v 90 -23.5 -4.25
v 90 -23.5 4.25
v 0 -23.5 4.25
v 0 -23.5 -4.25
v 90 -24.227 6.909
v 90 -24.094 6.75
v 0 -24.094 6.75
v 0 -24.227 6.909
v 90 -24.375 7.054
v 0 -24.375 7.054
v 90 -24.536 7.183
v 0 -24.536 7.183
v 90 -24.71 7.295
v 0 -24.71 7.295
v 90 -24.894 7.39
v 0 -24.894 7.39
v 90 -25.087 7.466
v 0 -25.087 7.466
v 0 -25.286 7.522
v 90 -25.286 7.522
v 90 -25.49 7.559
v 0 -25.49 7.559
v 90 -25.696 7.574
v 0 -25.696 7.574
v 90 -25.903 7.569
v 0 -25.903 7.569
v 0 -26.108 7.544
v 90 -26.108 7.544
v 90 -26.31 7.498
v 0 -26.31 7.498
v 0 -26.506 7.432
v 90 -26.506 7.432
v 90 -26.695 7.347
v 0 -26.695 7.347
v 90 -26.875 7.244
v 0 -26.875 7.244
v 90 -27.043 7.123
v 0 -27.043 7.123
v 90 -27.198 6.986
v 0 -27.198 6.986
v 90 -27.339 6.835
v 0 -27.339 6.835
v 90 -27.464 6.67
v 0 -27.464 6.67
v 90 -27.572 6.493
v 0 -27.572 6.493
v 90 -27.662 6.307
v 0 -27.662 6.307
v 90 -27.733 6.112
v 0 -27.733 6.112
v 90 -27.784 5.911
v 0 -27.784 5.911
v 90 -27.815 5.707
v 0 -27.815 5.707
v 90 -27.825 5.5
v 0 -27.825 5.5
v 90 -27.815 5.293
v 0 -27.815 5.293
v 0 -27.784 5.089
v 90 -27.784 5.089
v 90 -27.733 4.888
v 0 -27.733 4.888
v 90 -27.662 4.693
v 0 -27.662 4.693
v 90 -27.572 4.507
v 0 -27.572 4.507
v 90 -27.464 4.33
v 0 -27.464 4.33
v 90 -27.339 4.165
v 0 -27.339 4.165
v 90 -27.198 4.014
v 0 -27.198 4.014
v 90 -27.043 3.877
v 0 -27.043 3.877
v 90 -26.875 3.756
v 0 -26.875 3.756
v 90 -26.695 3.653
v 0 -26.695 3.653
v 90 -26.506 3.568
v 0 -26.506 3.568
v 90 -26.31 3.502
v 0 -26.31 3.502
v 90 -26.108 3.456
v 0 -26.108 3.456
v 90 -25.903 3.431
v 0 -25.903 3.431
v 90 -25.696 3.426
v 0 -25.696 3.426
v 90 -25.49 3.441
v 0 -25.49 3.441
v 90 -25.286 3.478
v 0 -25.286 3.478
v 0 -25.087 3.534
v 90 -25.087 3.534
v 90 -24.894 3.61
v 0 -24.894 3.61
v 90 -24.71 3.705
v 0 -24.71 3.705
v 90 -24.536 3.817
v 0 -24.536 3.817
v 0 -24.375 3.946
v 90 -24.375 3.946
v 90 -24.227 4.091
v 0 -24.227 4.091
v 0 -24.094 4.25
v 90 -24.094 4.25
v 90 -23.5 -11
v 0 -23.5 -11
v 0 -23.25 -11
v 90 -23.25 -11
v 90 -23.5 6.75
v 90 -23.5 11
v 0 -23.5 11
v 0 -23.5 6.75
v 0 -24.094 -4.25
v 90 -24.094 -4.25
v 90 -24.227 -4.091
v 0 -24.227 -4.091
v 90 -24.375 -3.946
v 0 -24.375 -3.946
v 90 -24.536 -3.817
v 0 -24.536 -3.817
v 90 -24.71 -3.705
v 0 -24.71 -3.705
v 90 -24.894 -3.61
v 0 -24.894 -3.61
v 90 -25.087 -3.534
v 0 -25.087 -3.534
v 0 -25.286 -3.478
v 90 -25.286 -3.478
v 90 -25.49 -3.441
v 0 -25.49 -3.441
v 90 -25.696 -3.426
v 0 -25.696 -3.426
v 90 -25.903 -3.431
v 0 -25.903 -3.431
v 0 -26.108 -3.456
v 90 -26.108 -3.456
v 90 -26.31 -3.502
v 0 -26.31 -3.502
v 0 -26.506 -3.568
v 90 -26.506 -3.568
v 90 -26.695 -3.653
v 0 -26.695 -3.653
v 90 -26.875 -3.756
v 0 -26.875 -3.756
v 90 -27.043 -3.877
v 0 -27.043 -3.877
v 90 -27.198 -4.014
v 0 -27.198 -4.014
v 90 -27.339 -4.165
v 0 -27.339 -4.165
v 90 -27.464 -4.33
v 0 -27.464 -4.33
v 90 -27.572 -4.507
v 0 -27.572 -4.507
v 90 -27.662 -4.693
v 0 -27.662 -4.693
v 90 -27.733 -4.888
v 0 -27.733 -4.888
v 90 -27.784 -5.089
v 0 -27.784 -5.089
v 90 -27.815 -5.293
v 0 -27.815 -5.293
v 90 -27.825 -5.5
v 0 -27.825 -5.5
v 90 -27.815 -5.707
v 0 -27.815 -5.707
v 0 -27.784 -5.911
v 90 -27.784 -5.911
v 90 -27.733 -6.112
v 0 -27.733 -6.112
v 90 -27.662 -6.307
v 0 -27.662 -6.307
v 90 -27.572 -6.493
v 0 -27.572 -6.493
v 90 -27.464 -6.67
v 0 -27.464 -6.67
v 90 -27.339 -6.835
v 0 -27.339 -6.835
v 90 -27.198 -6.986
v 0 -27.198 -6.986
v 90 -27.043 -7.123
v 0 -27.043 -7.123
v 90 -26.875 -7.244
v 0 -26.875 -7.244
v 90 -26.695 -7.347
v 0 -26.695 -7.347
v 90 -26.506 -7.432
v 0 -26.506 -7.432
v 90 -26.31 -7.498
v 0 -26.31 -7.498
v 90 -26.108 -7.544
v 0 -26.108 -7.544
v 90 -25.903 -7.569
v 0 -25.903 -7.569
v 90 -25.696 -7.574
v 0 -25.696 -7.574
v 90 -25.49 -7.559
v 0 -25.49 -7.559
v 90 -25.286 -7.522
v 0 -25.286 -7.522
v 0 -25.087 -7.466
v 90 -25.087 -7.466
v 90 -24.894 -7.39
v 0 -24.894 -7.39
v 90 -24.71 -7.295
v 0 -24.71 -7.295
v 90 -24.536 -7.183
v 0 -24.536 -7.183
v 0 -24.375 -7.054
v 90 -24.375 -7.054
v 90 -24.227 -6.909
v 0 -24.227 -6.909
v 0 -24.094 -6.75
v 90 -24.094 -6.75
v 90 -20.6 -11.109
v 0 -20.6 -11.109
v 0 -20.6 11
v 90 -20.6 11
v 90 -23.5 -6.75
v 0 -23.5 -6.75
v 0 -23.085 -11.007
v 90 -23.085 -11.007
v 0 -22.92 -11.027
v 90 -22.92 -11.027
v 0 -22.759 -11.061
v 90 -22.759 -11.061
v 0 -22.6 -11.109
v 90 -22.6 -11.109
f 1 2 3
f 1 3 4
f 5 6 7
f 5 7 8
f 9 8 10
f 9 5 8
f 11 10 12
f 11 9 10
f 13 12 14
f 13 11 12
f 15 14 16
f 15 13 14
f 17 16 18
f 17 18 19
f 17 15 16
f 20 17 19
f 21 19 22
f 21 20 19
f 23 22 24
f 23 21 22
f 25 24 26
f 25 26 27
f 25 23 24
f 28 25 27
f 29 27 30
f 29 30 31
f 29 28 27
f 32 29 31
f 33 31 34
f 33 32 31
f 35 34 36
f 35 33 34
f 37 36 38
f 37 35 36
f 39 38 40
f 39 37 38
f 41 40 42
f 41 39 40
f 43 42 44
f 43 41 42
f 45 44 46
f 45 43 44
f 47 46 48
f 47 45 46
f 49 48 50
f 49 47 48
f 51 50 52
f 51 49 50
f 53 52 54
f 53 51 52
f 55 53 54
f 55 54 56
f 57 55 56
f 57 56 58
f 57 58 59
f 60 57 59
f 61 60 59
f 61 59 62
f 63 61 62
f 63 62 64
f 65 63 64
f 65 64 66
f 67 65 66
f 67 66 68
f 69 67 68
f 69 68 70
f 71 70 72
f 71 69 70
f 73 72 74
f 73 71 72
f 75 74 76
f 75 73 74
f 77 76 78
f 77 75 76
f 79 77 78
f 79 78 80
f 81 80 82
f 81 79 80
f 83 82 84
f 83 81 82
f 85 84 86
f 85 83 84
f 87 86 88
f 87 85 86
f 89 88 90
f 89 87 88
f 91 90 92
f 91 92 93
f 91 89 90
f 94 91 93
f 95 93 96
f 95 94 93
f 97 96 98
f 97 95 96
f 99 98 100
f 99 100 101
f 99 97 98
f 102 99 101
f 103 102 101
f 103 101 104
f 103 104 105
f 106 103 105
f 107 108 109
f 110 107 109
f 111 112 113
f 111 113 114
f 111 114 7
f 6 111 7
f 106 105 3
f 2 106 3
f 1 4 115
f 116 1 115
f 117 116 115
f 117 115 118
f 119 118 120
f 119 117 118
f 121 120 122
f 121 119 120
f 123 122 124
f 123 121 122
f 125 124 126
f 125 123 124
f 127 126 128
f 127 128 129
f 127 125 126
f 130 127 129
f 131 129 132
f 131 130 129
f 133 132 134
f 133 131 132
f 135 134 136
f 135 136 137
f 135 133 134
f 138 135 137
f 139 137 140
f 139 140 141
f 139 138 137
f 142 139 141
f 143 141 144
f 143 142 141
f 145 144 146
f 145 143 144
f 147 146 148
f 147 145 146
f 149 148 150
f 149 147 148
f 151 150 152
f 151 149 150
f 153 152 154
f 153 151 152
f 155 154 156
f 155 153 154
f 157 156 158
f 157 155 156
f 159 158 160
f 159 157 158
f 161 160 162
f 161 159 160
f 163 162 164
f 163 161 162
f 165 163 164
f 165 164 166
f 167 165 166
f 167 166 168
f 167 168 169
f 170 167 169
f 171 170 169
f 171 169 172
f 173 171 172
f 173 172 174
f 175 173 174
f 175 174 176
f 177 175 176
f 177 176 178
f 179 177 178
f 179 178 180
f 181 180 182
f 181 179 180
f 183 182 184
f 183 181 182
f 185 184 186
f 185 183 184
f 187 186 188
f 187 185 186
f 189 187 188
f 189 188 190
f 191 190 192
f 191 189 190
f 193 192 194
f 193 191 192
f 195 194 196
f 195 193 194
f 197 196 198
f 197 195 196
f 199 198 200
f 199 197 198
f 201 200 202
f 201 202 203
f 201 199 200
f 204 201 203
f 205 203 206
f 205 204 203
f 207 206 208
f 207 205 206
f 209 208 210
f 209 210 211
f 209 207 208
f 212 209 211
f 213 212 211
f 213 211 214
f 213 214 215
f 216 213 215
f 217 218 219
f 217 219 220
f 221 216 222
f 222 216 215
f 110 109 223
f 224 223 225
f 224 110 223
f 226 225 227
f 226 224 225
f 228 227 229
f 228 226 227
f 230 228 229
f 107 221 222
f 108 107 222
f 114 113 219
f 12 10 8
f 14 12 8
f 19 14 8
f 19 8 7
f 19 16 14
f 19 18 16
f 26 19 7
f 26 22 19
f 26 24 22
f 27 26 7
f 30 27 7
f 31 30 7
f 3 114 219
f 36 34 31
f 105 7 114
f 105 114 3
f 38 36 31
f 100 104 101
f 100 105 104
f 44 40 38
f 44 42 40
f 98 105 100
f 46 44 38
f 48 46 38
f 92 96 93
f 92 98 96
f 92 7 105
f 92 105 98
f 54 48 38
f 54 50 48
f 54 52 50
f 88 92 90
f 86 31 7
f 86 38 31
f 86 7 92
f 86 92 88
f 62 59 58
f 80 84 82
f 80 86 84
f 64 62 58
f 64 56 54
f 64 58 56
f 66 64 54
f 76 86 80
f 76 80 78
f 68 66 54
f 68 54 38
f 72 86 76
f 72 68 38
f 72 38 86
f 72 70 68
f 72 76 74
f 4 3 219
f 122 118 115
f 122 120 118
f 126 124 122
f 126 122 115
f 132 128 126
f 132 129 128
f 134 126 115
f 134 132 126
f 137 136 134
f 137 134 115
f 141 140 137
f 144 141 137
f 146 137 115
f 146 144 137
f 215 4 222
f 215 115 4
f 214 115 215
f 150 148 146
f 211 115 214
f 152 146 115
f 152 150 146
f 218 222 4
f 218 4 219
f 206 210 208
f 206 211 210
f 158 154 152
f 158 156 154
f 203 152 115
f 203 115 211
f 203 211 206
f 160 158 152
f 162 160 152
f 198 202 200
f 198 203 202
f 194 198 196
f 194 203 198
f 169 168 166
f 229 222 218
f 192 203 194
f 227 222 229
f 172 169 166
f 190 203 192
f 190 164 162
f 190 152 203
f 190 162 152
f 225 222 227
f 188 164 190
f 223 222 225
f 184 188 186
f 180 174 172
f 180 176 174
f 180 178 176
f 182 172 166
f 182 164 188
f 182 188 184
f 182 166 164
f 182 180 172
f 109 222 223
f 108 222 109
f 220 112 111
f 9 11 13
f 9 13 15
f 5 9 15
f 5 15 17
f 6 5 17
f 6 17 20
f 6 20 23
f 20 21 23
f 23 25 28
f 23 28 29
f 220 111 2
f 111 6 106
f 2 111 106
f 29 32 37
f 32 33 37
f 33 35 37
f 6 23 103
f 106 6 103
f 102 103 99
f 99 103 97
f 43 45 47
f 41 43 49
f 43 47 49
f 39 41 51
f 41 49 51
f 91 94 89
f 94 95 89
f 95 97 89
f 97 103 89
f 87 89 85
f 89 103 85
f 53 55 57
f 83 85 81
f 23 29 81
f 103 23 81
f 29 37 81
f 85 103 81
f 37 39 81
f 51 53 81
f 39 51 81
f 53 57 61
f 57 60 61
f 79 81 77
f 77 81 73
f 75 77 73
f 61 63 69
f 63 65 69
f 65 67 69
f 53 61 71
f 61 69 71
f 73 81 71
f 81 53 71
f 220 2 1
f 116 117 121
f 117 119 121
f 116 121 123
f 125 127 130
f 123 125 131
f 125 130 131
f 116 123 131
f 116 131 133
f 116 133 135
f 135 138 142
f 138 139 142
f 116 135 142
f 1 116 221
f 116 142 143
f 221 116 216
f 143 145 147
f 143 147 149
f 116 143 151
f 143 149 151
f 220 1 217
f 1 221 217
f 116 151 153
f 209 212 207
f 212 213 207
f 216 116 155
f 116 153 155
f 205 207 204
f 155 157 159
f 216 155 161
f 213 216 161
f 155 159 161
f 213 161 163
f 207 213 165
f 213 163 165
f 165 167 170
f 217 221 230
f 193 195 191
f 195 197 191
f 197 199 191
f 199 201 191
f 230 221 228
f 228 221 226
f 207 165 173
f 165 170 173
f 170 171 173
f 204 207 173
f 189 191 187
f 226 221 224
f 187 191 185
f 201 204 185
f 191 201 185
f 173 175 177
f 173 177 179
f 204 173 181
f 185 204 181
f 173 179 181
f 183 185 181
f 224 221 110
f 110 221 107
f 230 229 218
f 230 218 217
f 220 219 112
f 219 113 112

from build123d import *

# Parameters (mm, degrees)
EXTRUDE_1_DEPTH             = 90
SKETCH_2_W                  = 90
SKETCH_2_H                  = 17.75
EXTRUDE_2_DEPTH             = 8.2
SKETCH_3_W                  = 90
SKETCH_3_H                  = 50.95
EXTRUDE_3_DEPTH             = 8.2
SKETCH_4_W                  = 3.95
SKETCH_4_H                  = 29.5
CUT_EXTRUDE_1_DEPTH         = 96.44153315
SKETCH_5_W                  = 3.95
SKETCH_5_H                  = 6.2
CUT_EXTRUDE_2_DEPTH         = 96.44153315
SKETCH_6_W                  = 2.25
SKETCH_6_H                  = 3.95
CUT_EXTRUDE_3_DEPTH         = 96.44153315
SKETCH_7_W                  = 4.5
SKETCH_7_H                  = 3.95
CUT_EXTRUDE_4_DEPTH         = 96.44153315
SKETCH_8_W                  = 2.25
SKETCH_8_H                  = 3.95
CUT_EXTRUDE_5_DEPTH         = 96.44153315
SKETCH_9_W                  = 3.95
SKETCH_9_H                  = 2.25
CUT_EXTRUDE_6_DEPTH         = 96.44153315
SKETCH_10_W                 = 20.2
SKETCH_10_H                 = 45.2
CUT_EXTRUDE_7_DEPTH         = 86
HOLE_WIZARD_2_5_2_5_1_D     = 2.5
HOLE_WIZARD_4_5_4_5_1_D     = 4.5
HOLE_WIZARD_8_3_8_3_1_D     = 8.3
HOLE_WIZARD_8_3_8_3_1_DEPTH = 3.2
FILLET_1_R                  = 2
FILLET_2_R                  = 2
EXTRUDE_START               = -90
SKETCH_17_R                 = 1.25
EXTRUDE_4_DEPTH             = 90
CUT_EXTRUDE_START           = -100
SKETCH_18_R                 = 4.15
CUT_EXTRUDE_8_DEPTH         = 100
CUT_EXTRUDE_9_DEPTH         = 106
SKETCH_20_W                 = 90
SKETCH_20_H                 = 22.108571968
EXTRUDE_5_DEPTH             = 2


with BuildPart() as part:
    # Эскиз1 → Бобышка-Вытянуть1 (new body)
    with BuildSketch(Plane(origin=(90, 0, 0), x_dir=(0, 0, -1), z_dir=(1, 0, 0))):
        with BuildLine():
            Line((6.75, -24.093761792), (6.75, 19.25))
            Line((6.75, 19.25), (-11.593761792, 19.25))
            ThreePointArc((-11.593761792, 19.25), (-15.325, 18), (-11.593761792, 16.75))
            Line((-11.593761792, 16.75), (-11, 16.75))
            Line((-11, 16.75), (-11, -16.75))
            Line((-11, -16.75), (-11.593761792, -16.75))
            ThreePointArc((-11.593761792, -16.75), (-15.325, -18), (-11.593761792, -19.25))
            Line((-11.593761792, -19.25), (-11, -19.25))
            Line((-11, -19.25), (-11, -23.5))
            Line((-11, -23.5), (-6.75, -23.5))
            Line((-6.75, -23.5), (-6.75, -24.093761792))
            ThreePointArc((-6.75, -24.093761792), (-5.5, -27.825), (-4.25, -24.093761792))
            Line((-4.25, -24.093761792), (-4.25, -23.5))
            Line((-4.25, -23.5), (4.25, -23.5))
            Line((4.25, -23.5), (4.25, -24.093761792))
            ThreePointArc((4.25, -24.093761792), (5.5, -27.825), (6.75, -24.093761792))
        make_face()
    extrude(amount=-EXTRUDE_1_DEPTH)

    # Эскиз2 → Бобышка-Вытянуть2 (add)
    with BuildSketch(Plane(origin=(0, 19.25, 0), x_dir=(-1, 0, 0), z_dir=(0, 1, 0))):
        with Locations((-45, 2.125)):
            Rectangle(SKETCH_2_W, SKETCH_2_H)
    extrude(amount=EXTRUDE_2_DEPTH)

    # Эскиз3 → Бобышка-Вытянуть3 (add)
    with BuildSketch(Plane(origin=(0, 0, -6.75), x_dir=(-1, 0, 0), z_dir=(0, 0, -1))):
        with Locations((-45, 1.975)):
            Rectangle(SKETCH_3_W, SKETCH_3_H)
    extrude(amount=EXTRUDE_3_DEPTH)

    # Эскиз4 → Вырез-Вытянуть1 (cut, through all)
    with BuildSketch(Plane.ZY):
        with Locations((-12.975, 0)):
            Rectangle(SKETCH_4_W, SKETCH_4_H)
    extrude(amount=-CUT_EXTRUDE_1_DEPTH, mode=Mode.SUBTRACT)

    # Эскиз5 → Вырез-Вытянуть2 (cut, through all)
    with BuildSketch(Plane.ZY):
        with Locations((-12.975, 24.35)):
            Rectangle(SKETCH_5_W, SKETCH_5_H)
    extrude(amount=-CUT_EXTRUDE_2_DEPTH, mode=Mode.SUBTRACT)

    # Эскиз6 → Вырез-Вытянуть3 (cut, through all)
    with BuildSketch(Plane.ZY):
        with Locations((-9.875, 25.475)):
            Rectangle(SKETCH_6_W, SKETCH_6_H)
    extrude(amount=-CUT_EXTRUDE_3_DEPTH, mode=Mode.SUBTRACT)

    # Эскиз7 → Вырез-Вытянуть4 (cut, through all)
    with BuildSketch(Plane.ZY):
        with Locations((0, 25.475)):
            Rectangle(SKETCH_7_W, SKETCH_7_H)
    extrude(amount=-CUT_EXTRUDE_4_DEPTH, mode=Mode.SUBTRACT)

    # Эскиз8 → Вырез-Вытянуть5 (cut, through all)
    with BuildSketch(Plane.ZY):
        with Locations((9.875, 25.475)):
            Rectangle(SKETCH_8_W, SKETCH_8_H)
    extrude(amount=-CUT_EXTRUDE_5_DEPTH, mode=Mode.SUBTRACT)

    # Эскиз9 → Вырез-Вытянуть6 (cut, through all)
    with BuildSketch(Plane.ZY):
        with Locations((-12.975, -22.375)):
            Rectangle(SKETCH_9_W, SKETCH_9_H)
    extrude(amount=-CUT_EXTRUDE_6_DEPTH, mode=Mode.SUBTRACT)

    # Эскиз10 → Вырез-Вытянуть7 (cut)
    with BuildSketch(Plane(origin=(90, 0, 0), x_dir=(0, 0, -1), z_dir=(1, 0, 0))):
        Rectangle(SKETCH_10_W, SKETCH_10_H)
    extrude(amount=-CUT_EXTRUDE_7_DEPTH, mode=Mode.SUBTRACT)

    # Диаметр отверстия Ø2.5 (2.5)1 (through all)
    with Locations(Plane(origin=(90, 0, 0), x_dir=(0, 0, -1), z_dir=(1, 0, 0))):
        with Locations((5.5, -25.75), (-13.25, -18), (-5.5, -25.75), (-13.25, 18)):
            Hole(HOLE_WIZARD_2_5_2_5_1_D / 2)

    # Диаметр отверстия Ø4.5 (4.5)1 (through all)
    with Locations(Plane.ZY):
        with Locations((-13.25, -18), (-13.25, 18), (-5.5, 25.75), (5.5, 25.75)):
            Hole(HOLE_WIZARD_4_5_4_5_1_D / 2)

    # Диаметр отверстия Ø8.3 (8.3)1
    with Locations(Plane.ZY):
        with Locations((0, 0)):
            Hole(HOLE_WIZARD_8_3_8_3_1_D / 2, depth=HOLE_WIZARD_8_3_8_3_1_DEPTH)

    # Скругление1
    fillet_1_edges = [part.edges().sort_by_distance(p)[0] for p in [
        (45, 23.5, 8.75),
    ]]
    fillet(fillet_1_edges, radius=FILLET_1_R)

    # Скругление2
    fillet_2_edges = [part.edges().sort_by_distance(p)[0] for p in [
        (45, 23.5, -8.75),
        (45, 23.5, 2.25),
        (45, 23.5, -2.25),
        (45, -21.25, -11),
        (4, 0, -10.1),
        (4, -22.6, 0),
        (4, 0, 10.1),
        (4, 22.6, 0),
        (45, 14.75, -11),
        (45, -14.75, -11),
        (45, 21.25, -11),
    ]]
    fillet(fillet_2_edges, radius=FILLET_2_R)

    # Эскиз17 → Бобышка-Вытянуть4 (add)
    with BuildSketch(Plane(origin=(90, 0, 0), x_dir=(0, 0, -1), z_dir=(1, 0, 0)).offset(EXTRUDE_START)):
        with Locations((5.5, -25.75)):
            Circle(SKETCH_17_R)
        with Locations((-5.5, -25.75)):
            Circle(SKETCH_17_R)
        with Locations((-13.25, -18)):
            Circle(SKETCH_17_R)
        with Locations((-13.25, 18)):
            Circle(SKETCH_17_R)
    extrude(amount=EXTRUDE_4_DEPTH)

    # Эскиз18 → Вырез-Вытянуть8 (cut)
    with BuildSketch(Plane.ZY.offset(CUT_EXTRUDE_START)):
        Circle(SKETCH_18_R)
    extrude(amount=CUT_EXTRUDE_8_DEPTH, mode=Mode.SUBTRACT)

    # Эскиз19 → Вырез-Вытянуть9 (cut)
    with BuildSketch(Plane(origin=(90, 0, 0), x_dir=(0, 0, -1), z_dir=(1, 0, 0))):
        Polygon((10.1, -22.6), (-10.1, -22.6), (-27.028488592, -22.6), (-27.028488592, 40.291612525), (29.6277603, 40.291612525), (29.6277603, -22.6), align=None)
    extrude(amount=-CUT_EXTRUDE_9_DEPTH, mode=Mode.SUBTRACT)

    # Эскиз20 → Бобышка-Вытянуть5 (add)
    with BuildSketch(Plane(origin=(0, -22.6, 0), x_dir=(1, 0, 0), z_dir=(0, 1, 0))):
        with Locations((45, 0.054285984)):
            Rectangle(SKETCH_20_W, SKETCH_20_H)
    extrude(amount=EXTRUDE_5_DEPTH)


solid = part.part
